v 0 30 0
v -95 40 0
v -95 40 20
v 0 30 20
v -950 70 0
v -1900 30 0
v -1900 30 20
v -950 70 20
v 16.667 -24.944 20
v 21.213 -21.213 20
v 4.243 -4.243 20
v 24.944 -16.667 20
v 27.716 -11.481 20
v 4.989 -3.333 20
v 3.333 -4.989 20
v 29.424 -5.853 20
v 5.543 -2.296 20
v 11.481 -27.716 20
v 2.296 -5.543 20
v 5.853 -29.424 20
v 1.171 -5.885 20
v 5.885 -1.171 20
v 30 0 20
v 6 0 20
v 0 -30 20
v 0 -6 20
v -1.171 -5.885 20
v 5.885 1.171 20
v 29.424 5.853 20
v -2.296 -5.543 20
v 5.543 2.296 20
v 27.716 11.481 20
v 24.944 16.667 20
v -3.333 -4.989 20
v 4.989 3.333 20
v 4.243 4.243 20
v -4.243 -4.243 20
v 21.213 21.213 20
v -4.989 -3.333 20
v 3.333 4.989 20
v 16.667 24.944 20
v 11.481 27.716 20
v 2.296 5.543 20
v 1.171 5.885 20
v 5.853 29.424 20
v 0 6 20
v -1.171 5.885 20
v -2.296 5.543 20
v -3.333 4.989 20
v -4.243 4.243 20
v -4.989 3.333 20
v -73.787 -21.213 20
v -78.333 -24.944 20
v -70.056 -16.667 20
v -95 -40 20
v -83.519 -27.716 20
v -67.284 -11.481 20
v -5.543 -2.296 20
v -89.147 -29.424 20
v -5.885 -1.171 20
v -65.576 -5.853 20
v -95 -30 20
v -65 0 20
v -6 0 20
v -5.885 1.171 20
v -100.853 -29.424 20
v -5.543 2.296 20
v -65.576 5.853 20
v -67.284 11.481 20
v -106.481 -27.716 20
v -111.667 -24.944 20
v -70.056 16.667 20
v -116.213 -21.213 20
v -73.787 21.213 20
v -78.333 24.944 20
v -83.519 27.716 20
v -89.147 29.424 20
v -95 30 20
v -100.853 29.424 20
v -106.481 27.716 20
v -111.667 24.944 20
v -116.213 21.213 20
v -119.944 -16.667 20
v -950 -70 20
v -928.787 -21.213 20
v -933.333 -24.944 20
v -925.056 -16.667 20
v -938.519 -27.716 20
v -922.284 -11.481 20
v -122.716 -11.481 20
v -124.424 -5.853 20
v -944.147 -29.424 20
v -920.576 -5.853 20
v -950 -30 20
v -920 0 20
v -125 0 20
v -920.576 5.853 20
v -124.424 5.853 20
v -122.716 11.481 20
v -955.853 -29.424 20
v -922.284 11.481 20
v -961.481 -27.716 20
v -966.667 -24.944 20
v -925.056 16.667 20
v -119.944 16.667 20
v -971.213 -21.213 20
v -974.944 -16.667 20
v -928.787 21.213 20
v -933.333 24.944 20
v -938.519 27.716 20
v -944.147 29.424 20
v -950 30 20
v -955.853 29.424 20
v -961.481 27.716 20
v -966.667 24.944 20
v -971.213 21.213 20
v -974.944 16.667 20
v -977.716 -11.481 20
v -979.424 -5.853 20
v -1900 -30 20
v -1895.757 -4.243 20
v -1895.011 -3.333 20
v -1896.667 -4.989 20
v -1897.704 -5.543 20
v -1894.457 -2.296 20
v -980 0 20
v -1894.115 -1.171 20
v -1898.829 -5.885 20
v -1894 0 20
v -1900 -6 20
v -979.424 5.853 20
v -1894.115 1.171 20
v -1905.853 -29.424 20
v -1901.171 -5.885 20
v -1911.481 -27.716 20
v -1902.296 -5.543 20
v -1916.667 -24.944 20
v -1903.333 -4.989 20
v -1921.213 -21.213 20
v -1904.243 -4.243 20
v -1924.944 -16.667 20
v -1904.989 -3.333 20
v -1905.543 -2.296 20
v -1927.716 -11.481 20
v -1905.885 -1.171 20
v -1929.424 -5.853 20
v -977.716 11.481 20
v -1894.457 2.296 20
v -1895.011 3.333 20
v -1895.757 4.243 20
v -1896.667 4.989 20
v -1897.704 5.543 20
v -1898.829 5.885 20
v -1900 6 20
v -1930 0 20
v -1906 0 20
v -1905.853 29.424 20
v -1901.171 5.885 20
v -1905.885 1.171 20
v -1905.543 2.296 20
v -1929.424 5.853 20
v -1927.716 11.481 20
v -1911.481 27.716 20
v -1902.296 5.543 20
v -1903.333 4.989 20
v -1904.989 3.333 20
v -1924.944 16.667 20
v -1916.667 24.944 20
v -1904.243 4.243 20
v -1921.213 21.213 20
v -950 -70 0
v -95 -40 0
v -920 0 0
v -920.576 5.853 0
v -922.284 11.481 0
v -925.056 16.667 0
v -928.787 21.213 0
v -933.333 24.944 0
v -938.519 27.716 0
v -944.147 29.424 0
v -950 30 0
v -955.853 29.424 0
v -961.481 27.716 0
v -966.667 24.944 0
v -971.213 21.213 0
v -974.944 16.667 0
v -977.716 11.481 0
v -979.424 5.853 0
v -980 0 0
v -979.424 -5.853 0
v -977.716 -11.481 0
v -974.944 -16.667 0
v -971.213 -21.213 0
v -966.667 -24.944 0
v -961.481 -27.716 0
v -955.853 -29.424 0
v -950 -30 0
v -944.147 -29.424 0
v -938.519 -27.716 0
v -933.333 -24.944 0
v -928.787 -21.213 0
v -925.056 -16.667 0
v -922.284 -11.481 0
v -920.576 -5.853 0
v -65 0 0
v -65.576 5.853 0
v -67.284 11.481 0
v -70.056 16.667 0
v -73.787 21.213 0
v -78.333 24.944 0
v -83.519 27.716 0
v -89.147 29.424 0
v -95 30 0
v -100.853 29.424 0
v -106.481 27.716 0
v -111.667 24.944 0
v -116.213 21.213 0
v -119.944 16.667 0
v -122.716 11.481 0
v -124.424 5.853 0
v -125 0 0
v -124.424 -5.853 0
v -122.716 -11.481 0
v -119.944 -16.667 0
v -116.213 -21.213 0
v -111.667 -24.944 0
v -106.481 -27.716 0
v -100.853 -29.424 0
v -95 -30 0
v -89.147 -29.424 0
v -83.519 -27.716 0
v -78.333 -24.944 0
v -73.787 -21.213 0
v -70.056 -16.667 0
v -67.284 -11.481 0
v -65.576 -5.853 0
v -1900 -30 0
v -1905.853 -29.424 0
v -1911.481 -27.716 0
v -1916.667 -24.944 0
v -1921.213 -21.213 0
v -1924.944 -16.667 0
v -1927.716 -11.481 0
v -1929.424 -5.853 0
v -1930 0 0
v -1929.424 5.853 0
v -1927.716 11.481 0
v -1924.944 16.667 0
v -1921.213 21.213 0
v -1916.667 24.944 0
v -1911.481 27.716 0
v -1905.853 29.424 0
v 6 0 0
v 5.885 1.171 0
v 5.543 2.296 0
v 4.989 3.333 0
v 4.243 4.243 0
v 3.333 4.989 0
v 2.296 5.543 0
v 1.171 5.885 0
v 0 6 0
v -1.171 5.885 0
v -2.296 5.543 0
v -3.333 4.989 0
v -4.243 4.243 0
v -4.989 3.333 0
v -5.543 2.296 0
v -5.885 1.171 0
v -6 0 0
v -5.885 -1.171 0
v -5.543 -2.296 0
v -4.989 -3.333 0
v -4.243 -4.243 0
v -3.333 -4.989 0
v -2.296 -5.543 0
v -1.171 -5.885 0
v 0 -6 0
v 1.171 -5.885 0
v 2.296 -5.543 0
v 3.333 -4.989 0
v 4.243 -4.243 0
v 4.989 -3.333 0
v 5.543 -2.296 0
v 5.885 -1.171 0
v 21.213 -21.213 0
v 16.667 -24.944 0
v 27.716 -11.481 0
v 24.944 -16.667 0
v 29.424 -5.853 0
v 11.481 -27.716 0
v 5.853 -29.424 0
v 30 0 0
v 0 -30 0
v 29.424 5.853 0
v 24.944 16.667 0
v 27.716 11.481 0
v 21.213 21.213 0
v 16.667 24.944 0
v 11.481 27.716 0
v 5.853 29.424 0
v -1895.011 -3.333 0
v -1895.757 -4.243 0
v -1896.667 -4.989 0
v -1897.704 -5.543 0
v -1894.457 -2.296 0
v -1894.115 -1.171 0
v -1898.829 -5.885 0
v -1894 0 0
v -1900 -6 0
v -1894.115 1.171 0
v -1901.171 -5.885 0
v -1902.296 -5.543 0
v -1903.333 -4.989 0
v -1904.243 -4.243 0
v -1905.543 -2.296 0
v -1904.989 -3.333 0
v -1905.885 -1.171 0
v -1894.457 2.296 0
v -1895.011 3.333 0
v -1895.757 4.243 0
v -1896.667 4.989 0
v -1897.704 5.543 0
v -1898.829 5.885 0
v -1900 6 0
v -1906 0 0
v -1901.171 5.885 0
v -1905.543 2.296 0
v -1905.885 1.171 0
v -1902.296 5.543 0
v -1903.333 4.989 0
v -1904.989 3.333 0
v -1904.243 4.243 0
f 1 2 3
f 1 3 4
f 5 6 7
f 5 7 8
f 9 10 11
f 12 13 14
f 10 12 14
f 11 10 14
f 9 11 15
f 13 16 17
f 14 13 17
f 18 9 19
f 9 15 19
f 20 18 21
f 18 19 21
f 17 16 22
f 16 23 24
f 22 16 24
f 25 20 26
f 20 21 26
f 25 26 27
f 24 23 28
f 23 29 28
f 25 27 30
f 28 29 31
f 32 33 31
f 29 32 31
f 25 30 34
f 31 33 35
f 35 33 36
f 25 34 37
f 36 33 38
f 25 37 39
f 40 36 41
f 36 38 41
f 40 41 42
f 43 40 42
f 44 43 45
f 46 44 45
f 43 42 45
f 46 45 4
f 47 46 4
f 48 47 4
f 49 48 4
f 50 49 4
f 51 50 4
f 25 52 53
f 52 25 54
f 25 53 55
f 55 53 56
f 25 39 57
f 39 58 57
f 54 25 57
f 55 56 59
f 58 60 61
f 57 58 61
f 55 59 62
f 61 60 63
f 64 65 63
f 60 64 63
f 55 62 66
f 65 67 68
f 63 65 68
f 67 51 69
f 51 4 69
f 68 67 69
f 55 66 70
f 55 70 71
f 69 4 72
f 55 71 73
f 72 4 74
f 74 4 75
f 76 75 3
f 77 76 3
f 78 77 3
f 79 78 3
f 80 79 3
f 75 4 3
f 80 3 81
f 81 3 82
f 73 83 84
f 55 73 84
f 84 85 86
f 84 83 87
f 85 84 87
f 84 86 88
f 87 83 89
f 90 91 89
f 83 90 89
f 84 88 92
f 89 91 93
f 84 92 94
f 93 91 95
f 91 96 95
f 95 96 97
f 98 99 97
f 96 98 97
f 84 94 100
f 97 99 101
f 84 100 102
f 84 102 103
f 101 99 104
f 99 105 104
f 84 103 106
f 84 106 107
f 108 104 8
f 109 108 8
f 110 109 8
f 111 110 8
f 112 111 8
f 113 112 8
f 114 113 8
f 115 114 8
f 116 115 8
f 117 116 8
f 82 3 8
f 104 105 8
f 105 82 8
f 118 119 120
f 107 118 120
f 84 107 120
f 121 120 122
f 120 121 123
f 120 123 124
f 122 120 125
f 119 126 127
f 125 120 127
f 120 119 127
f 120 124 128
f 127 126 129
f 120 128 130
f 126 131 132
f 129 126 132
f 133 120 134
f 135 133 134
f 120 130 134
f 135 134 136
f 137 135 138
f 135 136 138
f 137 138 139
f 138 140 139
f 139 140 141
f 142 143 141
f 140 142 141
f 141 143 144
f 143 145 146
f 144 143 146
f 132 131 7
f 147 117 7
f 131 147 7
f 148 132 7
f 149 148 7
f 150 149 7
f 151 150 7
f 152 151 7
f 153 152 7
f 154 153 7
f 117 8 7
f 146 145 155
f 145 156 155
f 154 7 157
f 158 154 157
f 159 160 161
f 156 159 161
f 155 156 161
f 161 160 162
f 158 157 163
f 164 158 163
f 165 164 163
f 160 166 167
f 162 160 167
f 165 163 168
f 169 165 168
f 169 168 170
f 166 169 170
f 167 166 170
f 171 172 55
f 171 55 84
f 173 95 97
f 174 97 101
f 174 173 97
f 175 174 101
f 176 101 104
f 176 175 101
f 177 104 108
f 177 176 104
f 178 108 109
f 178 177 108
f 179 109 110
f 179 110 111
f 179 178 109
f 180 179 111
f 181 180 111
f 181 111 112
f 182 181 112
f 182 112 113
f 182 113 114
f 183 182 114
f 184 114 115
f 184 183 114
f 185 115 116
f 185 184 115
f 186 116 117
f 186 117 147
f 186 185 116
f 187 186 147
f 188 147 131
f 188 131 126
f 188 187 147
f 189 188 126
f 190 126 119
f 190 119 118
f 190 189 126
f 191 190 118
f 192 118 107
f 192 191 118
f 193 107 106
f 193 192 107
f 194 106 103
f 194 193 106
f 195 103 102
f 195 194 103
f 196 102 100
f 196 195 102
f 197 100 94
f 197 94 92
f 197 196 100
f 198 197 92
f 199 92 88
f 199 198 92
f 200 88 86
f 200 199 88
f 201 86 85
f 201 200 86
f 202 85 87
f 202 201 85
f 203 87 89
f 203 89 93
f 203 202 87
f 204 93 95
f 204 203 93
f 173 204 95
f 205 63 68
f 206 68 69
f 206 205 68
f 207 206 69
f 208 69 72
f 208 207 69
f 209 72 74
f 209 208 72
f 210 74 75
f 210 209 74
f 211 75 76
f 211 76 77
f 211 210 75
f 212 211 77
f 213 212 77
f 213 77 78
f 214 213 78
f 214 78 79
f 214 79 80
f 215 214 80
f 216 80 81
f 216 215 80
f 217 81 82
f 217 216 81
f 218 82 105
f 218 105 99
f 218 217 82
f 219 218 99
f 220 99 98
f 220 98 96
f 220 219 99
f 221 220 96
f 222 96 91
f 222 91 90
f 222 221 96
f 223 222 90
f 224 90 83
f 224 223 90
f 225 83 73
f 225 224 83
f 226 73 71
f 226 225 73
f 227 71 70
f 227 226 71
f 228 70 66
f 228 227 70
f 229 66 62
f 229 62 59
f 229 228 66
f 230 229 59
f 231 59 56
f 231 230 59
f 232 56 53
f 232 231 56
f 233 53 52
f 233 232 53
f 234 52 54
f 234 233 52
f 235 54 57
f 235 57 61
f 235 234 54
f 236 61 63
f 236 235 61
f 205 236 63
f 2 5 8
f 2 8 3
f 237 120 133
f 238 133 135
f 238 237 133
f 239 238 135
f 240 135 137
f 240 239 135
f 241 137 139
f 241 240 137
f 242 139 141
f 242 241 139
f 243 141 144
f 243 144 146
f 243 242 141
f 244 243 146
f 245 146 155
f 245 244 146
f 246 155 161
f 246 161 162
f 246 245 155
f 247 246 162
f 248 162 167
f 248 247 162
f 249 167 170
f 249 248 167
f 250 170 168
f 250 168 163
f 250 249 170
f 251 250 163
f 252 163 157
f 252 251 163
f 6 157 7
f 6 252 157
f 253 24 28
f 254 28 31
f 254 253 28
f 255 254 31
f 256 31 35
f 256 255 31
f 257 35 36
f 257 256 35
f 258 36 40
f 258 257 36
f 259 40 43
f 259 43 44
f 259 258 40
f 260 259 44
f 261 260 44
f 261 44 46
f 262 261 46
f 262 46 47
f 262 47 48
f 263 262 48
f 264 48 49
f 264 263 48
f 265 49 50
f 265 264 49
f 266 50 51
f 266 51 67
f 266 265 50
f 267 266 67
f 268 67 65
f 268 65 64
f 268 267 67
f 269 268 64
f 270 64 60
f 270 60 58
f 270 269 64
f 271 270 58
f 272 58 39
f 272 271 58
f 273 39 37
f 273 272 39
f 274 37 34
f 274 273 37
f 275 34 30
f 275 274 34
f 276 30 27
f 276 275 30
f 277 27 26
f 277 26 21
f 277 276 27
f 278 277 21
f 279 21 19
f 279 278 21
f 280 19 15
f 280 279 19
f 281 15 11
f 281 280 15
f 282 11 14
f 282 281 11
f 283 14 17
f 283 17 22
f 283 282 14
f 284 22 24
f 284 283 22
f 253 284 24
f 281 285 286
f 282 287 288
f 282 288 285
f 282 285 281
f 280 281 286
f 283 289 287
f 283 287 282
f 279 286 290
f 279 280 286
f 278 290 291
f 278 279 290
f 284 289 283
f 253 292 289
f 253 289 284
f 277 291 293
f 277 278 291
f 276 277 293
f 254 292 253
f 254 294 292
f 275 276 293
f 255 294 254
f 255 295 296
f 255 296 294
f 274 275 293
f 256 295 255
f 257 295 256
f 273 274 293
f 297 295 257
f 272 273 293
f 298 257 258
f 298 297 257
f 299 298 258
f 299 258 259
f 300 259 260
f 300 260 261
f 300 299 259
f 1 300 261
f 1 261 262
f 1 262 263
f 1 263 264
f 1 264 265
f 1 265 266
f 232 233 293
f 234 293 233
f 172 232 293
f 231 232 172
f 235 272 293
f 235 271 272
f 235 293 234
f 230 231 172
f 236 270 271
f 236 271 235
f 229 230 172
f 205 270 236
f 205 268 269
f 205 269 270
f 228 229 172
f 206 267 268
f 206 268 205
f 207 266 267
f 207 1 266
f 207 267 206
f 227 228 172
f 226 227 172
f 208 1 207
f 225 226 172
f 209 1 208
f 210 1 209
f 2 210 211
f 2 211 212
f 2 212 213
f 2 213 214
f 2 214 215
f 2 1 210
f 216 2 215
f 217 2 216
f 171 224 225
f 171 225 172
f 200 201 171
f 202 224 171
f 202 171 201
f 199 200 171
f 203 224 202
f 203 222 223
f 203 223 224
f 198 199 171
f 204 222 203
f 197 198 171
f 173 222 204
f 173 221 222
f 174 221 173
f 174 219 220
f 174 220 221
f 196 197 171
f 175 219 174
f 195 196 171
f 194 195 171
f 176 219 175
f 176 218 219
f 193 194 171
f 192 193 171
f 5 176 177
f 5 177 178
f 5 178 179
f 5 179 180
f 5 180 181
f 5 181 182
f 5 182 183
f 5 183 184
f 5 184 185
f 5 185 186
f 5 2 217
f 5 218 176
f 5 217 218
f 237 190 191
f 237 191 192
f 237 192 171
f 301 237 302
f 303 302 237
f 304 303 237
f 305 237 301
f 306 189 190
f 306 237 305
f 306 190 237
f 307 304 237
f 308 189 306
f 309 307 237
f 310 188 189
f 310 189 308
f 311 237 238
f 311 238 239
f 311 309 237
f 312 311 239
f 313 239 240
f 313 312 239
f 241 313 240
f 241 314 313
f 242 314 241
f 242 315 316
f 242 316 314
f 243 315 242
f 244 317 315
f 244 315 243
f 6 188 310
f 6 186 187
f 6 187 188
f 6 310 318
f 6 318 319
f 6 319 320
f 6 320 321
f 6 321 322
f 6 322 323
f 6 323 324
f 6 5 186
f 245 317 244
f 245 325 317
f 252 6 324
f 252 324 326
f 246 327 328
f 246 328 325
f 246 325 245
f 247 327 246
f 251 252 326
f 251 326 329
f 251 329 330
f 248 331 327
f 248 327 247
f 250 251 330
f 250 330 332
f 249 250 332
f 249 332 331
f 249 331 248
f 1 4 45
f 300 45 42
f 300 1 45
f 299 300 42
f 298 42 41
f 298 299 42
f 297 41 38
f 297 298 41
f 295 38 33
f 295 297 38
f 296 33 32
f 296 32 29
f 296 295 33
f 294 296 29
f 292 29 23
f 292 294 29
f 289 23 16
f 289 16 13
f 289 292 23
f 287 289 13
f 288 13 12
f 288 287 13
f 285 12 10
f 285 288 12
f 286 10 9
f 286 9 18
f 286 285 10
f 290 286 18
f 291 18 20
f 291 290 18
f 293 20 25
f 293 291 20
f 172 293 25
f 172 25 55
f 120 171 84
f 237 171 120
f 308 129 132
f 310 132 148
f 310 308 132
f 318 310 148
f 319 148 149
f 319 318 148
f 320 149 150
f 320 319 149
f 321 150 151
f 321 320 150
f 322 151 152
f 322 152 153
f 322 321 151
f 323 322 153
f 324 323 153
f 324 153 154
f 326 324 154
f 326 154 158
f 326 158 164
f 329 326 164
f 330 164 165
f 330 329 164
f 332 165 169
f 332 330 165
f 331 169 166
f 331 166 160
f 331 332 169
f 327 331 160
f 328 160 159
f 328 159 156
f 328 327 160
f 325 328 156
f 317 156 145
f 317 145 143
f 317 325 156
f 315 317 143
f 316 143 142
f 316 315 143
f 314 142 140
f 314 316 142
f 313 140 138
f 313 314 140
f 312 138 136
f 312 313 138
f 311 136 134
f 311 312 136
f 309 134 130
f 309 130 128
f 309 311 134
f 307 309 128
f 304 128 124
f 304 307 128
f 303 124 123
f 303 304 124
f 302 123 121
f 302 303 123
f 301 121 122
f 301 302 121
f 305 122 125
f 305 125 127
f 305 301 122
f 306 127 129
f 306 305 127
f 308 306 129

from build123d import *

# Parameters (mm, degrees)
SKIZZE1_R                       = 30
SKIZZE1_R_2                     = 6
AUFSATZ_LINEAR_AUSTRAGEN1_DEPTH = 20


with BuildPart() as part:
    # Skizze1 → Aufsatz-Linear austragen1 (new body)
    with BuildSketch(Plane.XY):
        with BuildLine():
            Line((-950, 70), (-95, 40))
            Line((-95, 40), (0, 30))
            ThreePointArc((0, 30), (30, 0), (0, -30))
            Line((0, -30), (-95, -40))
            Line((-95, -40), (-950, -70))
            Line((-950, -70), (-1900, -30))
            ThreePointArc((-1900, -30), (-1930, 0), (-1900, 30))
            Line((-1900, 30), (-950, 70))
        make_face()
        with Locations((-950, 0)):
            Circle(SKIZZE1_R, mode=Mode.SUBTRACT)
        with Locations((-95, 0)):
            Circle(SKIZZE1_R, mode=Mode.SUBTRACT)
        with Locations((-1900, 0)):
            Circle(SKIZZE1_R_2, mode=Mode.SUBTRACT)
        Circle(SKIZZE1_R_2, mode=Mode.SUBTRACT)
    extrude(amount=AUFSATZ_LINEAR_AUSTRAGEN1_DEPTH)


solid = part.part
